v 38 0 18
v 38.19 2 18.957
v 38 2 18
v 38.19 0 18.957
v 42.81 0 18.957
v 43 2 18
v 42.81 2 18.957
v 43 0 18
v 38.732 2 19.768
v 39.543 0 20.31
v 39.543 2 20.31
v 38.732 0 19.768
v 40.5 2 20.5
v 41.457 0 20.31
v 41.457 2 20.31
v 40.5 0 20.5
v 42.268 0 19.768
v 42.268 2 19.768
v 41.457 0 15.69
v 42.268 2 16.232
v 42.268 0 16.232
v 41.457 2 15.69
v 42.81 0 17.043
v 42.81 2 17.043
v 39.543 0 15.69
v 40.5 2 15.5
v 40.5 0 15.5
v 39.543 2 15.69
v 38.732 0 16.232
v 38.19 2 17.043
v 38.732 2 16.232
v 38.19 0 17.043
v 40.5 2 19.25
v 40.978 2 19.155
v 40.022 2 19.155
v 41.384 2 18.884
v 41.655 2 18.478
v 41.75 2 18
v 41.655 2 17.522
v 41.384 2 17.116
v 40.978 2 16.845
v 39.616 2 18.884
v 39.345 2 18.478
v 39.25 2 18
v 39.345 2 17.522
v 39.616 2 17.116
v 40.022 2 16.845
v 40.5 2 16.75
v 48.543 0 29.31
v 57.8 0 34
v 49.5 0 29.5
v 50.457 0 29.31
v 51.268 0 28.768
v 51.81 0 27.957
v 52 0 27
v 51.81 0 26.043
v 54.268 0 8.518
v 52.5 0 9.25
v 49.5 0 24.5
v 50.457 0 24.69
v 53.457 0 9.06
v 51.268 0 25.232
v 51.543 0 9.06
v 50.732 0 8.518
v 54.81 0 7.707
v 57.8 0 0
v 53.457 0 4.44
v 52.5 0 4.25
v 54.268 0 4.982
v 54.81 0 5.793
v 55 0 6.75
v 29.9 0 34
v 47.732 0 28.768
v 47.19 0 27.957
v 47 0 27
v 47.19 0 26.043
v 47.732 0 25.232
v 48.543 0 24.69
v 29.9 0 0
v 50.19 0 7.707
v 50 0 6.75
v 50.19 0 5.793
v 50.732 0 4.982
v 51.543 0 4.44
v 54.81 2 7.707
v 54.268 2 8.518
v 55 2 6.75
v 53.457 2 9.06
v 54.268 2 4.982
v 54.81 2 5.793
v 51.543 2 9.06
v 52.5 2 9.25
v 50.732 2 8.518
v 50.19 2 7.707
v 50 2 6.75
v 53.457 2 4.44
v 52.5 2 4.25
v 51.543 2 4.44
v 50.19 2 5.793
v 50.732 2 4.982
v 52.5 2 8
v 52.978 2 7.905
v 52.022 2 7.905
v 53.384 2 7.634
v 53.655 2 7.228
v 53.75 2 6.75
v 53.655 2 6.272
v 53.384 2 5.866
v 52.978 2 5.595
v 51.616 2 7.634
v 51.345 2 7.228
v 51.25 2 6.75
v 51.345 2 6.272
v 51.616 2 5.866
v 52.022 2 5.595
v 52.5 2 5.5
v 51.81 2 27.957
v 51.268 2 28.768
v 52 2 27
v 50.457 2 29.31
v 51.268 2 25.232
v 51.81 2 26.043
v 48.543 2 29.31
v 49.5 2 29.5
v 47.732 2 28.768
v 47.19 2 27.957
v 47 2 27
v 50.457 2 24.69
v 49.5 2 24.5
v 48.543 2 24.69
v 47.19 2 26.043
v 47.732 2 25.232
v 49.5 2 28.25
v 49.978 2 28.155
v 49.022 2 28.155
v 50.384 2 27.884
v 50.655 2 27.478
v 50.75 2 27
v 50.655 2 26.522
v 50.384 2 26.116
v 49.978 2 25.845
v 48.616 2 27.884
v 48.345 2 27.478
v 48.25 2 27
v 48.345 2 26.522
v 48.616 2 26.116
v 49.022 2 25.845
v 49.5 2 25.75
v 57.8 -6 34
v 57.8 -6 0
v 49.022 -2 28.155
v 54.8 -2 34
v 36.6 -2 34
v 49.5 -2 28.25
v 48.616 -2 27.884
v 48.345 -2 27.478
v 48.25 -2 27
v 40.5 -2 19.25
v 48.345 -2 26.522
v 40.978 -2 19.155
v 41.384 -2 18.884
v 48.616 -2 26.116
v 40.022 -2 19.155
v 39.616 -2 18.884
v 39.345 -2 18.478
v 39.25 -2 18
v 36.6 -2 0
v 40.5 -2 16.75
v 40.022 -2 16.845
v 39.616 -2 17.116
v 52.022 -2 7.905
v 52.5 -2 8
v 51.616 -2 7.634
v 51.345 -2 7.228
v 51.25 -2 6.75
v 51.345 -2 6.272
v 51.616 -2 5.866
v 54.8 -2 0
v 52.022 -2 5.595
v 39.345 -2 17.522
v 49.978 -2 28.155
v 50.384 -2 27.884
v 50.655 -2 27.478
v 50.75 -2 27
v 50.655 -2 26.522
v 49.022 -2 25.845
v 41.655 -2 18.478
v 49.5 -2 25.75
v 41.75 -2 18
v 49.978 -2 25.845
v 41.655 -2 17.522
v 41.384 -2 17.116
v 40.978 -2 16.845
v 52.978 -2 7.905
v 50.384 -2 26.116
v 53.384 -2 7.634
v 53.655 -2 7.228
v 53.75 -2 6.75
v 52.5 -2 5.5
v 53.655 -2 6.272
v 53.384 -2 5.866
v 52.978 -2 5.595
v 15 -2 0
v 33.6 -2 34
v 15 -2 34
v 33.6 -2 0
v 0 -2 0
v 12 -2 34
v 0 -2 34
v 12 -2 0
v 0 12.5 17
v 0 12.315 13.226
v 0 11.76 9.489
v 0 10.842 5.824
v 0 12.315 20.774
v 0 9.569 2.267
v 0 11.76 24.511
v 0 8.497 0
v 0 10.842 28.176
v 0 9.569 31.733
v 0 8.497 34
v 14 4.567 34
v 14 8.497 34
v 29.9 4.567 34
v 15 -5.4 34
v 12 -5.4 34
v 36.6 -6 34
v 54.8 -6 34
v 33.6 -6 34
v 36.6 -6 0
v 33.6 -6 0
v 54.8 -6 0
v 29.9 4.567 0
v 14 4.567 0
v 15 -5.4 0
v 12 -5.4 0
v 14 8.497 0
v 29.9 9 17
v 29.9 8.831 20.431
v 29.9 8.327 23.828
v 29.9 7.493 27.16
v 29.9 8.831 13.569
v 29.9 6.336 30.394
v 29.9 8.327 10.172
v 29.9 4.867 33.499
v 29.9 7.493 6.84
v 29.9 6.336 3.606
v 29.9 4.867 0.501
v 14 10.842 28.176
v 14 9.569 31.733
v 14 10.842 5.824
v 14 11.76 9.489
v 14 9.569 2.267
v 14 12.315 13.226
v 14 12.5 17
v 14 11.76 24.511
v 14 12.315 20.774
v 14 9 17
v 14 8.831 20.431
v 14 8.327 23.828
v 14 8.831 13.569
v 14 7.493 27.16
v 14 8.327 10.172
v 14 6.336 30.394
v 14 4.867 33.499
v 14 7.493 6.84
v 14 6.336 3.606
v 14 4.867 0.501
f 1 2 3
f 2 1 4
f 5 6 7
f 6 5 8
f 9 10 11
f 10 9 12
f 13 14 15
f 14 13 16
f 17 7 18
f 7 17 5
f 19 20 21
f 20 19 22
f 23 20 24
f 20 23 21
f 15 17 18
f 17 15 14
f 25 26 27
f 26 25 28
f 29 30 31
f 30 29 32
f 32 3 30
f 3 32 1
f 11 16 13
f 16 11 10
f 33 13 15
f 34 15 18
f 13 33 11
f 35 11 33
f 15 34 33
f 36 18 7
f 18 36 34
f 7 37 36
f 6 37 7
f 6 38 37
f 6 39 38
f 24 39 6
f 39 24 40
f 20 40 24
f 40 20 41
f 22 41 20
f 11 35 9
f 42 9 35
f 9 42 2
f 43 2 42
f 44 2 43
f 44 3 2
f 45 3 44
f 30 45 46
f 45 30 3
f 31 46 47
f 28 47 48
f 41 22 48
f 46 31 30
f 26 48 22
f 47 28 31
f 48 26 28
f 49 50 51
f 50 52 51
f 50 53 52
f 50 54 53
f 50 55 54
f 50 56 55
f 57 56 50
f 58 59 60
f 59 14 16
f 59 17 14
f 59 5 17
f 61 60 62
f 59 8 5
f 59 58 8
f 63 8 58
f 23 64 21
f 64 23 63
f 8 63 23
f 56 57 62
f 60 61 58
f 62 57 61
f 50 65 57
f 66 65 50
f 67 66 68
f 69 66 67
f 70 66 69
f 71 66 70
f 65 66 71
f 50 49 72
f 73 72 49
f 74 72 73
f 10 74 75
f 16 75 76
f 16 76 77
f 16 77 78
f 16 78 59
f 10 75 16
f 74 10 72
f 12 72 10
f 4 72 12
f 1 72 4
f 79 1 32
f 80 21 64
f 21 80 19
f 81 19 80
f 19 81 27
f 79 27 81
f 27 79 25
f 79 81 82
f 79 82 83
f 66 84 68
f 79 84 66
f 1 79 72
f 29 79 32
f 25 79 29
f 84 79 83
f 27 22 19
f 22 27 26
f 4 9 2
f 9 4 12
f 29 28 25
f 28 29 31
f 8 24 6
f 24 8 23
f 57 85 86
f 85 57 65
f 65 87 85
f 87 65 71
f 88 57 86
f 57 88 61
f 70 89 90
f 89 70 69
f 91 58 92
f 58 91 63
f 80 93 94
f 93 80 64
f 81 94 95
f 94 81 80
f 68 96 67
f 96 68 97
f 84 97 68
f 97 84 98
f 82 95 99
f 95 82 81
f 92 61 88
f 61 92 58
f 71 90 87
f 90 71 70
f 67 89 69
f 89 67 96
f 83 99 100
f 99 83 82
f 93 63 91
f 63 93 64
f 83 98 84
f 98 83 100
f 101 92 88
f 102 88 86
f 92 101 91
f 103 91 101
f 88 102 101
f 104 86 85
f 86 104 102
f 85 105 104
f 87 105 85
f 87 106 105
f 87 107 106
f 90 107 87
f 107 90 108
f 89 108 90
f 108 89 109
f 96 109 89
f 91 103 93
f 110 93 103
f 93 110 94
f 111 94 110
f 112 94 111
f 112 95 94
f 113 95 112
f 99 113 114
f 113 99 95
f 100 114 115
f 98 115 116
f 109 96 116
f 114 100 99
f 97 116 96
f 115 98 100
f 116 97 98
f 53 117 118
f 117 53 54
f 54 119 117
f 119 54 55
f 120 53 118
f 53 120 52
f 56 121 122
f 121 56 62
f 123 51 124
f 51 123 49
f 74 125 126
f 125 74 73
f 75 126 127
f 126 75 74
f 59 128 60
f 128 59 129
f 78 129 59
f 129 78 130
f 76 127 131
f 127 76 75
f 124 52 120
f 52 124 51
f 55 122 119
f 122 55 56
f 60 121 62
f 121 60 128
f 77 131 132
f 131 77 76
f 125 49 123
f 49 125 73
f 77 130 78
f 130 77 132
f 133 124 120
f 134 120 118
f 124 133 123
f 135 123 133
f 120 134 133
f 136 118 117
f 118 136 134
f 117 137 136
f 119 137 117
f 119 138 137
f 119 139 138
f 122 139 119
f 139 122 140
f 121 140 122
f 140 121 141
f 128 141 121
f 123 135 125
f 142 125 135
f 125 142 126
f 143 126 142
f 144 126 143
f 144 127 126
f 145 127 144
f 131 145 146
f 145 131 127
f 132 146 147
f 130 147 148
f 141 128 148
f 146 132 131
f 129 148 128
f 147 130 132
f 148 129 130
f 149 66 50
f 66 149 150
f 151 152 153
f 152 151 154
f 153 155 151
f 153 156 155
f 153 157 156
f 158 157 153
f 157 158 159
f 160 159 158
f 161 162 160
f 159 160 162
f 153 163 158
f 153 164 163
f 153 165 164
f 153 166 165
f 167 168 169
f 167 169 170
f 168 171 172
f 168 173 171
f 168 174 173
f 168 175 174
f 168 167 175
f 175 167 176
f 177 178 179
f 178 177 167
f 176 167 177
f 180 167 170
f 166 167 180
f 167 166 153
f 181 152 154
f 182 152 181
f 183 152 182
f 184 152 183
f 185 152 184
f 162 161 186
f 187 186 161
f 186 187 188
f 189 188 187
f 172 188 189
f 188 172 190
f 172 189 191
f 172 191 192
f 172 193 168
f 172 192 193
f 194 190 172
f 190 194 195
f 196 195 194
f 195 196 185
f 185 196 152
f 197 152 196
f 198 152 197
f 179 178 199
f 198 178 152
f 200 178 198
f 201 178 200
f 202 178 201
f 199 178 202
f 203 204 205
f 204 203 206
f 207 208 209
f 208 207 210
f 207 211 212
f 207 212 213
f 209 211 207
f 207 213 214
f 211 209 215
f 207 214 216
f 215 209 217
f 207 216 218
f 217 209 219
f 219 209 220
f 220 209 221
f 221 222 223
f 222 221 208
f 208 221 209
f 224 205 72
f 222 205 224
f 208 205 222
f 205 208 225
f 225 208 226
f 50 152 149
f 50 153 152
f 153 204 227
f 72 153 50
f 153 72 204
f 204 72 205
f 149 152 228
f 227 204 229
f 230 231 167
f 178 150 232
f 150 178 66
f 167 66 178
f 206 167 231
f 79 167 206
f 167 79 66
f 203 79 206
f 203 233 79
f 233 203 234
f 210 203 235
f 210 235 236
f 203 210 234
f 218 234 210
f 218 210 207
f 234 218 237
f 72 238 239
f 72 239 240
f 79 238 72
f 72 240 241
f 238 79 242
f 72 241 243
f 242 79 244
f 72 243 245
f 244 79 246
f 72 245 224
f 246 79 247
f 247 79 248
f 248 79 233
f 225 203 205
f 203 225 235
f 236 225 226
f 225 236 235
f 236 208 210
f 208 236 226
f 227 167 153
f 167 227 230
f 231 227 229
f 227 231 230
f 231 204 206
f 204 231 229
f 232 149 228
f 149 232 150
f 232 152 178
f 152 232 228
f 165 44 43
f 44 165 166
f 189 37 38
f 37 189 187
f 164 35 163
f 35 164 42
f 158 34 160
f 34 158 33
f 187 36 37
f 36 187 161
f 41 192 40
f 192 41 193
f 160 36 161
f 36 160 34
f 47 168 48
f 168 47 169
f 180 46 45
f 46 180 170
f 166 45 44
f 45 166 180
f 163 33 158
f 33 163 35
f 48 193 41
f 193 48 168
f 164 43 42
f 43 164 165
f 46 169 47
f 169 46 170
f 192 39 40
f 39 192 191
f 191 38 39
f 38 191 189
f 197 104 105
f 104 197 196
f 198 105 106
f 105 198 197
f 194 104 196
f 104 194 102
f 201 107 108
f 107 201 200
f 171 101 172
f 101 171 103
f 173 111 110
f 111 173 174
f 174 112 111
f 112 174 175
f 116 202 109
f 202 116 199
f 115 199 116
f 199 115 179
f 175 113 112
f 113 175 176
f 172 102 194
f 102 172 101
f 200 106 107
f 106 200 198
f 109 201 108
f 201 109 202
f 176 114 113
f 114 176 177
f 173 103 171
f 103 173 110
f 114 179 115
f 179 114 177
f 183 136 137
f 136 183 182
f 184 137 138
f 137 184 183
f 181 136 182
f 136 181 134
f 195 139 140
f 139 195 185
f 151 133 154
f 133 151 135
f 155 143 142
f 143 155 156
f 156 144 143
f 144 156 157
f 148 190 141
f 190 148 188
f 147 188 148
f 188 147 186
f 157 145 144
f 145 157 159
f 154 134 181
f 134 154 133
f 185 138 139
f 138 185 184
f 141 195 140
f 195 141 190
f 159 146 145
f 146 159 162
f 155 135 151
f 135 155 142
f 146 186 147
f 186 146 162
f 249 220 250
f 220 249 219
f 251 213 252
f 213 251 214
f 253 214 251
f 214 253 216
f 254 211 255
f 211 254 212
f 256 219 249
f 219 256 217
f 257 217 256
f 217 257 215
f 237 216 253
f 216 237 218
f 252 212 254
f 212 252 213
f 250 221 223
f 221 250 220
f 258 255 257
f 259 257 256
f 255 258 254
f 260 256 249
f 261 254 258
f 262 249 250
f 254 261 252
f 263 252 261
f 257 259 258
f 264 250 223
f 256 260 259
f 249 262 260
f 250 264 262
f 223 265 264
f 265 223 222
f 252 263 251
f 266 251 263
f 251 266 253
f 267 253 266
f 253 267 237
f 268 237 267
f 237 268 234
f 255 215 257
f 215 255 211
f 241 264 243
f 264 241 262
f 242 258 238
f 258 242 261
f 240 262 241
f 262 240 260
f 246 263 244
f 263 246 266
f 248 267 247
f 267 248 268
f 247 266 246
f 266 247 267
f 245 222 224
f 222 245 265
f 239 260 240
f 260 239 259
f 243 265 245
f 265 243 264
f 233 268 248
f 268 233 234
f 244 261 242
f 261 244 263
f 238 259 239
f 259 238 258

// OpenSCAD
/*
Generic Action Camera Adapter for 3DR Solo
Copyright (C) 2016 - 2017  Hugh Eaves

This program is free software: you can redistribute it and/or modify
it under the terms of the GNU General Public License as published by
the Free Software Foundation, either version 3 of the License, or
(at your option) any later version.

This program is distributed in the hope that it will be useful,
but WITHOUT ANY WARRANTY; without even the implied warranty of
MERCHANTABILITY or FITNESS FOR A PARTICULAR PURPOSE.  See the
GNU General Public License for more details.

You should have received a copy of the GNU General Public License
along with this program.  If not, see <http://www.gnu.org/licenses/>.
*/

// This is the size (width) of the weight. Larger values make it bigger and heavier.
weight_length = 29.9;

// Values greater than zero move the weight to the outer side of the gimbal
weight_offset = 0;

thickness = 2;
length = 57.8;
width = 34;
weight_thickness = 100;
cutout_offset = 37;
cutout_length = 18;
cutout_thickness = 4;
cutout_gap = 0.4;
hole_diameter = 2.5;
$fn = 16;

module clip() {
  intersection() {
    difference() {
      union() {
        cube([length, width, thickness]);
        translate([weight_offset, 0, -weight_thickness])
          cube([weight_length, width, weight_thickness]);
        translate([12, 0, thickness])
          cube([3, width, 3.4]);
        translate([33.6, 0, thickness])
          cube([3, width, 4]);
        translate([54.8, 0, thickness])
          cube([3, width, 4]); 
        
       translate([36, 0, 0]) {
        translate([4.5, 18, -2])
          cylinder(d = 5, h = 2);
        translate([16.5, 6.75, -2])
          cylinder(d = 5, h = 2);
        translate([13.5, 27, -2])
          cylinder(d = 5, h = 2);
       }

      }
      translate([36, 0, 0]) {
        translate([4.5, 18, -90])
          cylinder(d = hole_diameter, h = 100);
        translate([16.5, 6.75, -90])
          cylinder(d = hole_diameter, h = 100);
        translate([13.5, 27, -90])
          cylinder(d = hole_diameter, h = 100);
      } 

    }
    mirror([-1, 0, 1])
      translate([26, width / 2, 0]) {
        cylinder(d = 77, h = 14, $fn = 64);
        translate([0, 0, 14])
          cylinder(d = 70, h = 16, $fn = 64);
        translate([0, 0, 30])
          cylinder(d = 77, h = 100, $fn = 64);
      }
  }
}

rotate([90,0,0])
clip();
